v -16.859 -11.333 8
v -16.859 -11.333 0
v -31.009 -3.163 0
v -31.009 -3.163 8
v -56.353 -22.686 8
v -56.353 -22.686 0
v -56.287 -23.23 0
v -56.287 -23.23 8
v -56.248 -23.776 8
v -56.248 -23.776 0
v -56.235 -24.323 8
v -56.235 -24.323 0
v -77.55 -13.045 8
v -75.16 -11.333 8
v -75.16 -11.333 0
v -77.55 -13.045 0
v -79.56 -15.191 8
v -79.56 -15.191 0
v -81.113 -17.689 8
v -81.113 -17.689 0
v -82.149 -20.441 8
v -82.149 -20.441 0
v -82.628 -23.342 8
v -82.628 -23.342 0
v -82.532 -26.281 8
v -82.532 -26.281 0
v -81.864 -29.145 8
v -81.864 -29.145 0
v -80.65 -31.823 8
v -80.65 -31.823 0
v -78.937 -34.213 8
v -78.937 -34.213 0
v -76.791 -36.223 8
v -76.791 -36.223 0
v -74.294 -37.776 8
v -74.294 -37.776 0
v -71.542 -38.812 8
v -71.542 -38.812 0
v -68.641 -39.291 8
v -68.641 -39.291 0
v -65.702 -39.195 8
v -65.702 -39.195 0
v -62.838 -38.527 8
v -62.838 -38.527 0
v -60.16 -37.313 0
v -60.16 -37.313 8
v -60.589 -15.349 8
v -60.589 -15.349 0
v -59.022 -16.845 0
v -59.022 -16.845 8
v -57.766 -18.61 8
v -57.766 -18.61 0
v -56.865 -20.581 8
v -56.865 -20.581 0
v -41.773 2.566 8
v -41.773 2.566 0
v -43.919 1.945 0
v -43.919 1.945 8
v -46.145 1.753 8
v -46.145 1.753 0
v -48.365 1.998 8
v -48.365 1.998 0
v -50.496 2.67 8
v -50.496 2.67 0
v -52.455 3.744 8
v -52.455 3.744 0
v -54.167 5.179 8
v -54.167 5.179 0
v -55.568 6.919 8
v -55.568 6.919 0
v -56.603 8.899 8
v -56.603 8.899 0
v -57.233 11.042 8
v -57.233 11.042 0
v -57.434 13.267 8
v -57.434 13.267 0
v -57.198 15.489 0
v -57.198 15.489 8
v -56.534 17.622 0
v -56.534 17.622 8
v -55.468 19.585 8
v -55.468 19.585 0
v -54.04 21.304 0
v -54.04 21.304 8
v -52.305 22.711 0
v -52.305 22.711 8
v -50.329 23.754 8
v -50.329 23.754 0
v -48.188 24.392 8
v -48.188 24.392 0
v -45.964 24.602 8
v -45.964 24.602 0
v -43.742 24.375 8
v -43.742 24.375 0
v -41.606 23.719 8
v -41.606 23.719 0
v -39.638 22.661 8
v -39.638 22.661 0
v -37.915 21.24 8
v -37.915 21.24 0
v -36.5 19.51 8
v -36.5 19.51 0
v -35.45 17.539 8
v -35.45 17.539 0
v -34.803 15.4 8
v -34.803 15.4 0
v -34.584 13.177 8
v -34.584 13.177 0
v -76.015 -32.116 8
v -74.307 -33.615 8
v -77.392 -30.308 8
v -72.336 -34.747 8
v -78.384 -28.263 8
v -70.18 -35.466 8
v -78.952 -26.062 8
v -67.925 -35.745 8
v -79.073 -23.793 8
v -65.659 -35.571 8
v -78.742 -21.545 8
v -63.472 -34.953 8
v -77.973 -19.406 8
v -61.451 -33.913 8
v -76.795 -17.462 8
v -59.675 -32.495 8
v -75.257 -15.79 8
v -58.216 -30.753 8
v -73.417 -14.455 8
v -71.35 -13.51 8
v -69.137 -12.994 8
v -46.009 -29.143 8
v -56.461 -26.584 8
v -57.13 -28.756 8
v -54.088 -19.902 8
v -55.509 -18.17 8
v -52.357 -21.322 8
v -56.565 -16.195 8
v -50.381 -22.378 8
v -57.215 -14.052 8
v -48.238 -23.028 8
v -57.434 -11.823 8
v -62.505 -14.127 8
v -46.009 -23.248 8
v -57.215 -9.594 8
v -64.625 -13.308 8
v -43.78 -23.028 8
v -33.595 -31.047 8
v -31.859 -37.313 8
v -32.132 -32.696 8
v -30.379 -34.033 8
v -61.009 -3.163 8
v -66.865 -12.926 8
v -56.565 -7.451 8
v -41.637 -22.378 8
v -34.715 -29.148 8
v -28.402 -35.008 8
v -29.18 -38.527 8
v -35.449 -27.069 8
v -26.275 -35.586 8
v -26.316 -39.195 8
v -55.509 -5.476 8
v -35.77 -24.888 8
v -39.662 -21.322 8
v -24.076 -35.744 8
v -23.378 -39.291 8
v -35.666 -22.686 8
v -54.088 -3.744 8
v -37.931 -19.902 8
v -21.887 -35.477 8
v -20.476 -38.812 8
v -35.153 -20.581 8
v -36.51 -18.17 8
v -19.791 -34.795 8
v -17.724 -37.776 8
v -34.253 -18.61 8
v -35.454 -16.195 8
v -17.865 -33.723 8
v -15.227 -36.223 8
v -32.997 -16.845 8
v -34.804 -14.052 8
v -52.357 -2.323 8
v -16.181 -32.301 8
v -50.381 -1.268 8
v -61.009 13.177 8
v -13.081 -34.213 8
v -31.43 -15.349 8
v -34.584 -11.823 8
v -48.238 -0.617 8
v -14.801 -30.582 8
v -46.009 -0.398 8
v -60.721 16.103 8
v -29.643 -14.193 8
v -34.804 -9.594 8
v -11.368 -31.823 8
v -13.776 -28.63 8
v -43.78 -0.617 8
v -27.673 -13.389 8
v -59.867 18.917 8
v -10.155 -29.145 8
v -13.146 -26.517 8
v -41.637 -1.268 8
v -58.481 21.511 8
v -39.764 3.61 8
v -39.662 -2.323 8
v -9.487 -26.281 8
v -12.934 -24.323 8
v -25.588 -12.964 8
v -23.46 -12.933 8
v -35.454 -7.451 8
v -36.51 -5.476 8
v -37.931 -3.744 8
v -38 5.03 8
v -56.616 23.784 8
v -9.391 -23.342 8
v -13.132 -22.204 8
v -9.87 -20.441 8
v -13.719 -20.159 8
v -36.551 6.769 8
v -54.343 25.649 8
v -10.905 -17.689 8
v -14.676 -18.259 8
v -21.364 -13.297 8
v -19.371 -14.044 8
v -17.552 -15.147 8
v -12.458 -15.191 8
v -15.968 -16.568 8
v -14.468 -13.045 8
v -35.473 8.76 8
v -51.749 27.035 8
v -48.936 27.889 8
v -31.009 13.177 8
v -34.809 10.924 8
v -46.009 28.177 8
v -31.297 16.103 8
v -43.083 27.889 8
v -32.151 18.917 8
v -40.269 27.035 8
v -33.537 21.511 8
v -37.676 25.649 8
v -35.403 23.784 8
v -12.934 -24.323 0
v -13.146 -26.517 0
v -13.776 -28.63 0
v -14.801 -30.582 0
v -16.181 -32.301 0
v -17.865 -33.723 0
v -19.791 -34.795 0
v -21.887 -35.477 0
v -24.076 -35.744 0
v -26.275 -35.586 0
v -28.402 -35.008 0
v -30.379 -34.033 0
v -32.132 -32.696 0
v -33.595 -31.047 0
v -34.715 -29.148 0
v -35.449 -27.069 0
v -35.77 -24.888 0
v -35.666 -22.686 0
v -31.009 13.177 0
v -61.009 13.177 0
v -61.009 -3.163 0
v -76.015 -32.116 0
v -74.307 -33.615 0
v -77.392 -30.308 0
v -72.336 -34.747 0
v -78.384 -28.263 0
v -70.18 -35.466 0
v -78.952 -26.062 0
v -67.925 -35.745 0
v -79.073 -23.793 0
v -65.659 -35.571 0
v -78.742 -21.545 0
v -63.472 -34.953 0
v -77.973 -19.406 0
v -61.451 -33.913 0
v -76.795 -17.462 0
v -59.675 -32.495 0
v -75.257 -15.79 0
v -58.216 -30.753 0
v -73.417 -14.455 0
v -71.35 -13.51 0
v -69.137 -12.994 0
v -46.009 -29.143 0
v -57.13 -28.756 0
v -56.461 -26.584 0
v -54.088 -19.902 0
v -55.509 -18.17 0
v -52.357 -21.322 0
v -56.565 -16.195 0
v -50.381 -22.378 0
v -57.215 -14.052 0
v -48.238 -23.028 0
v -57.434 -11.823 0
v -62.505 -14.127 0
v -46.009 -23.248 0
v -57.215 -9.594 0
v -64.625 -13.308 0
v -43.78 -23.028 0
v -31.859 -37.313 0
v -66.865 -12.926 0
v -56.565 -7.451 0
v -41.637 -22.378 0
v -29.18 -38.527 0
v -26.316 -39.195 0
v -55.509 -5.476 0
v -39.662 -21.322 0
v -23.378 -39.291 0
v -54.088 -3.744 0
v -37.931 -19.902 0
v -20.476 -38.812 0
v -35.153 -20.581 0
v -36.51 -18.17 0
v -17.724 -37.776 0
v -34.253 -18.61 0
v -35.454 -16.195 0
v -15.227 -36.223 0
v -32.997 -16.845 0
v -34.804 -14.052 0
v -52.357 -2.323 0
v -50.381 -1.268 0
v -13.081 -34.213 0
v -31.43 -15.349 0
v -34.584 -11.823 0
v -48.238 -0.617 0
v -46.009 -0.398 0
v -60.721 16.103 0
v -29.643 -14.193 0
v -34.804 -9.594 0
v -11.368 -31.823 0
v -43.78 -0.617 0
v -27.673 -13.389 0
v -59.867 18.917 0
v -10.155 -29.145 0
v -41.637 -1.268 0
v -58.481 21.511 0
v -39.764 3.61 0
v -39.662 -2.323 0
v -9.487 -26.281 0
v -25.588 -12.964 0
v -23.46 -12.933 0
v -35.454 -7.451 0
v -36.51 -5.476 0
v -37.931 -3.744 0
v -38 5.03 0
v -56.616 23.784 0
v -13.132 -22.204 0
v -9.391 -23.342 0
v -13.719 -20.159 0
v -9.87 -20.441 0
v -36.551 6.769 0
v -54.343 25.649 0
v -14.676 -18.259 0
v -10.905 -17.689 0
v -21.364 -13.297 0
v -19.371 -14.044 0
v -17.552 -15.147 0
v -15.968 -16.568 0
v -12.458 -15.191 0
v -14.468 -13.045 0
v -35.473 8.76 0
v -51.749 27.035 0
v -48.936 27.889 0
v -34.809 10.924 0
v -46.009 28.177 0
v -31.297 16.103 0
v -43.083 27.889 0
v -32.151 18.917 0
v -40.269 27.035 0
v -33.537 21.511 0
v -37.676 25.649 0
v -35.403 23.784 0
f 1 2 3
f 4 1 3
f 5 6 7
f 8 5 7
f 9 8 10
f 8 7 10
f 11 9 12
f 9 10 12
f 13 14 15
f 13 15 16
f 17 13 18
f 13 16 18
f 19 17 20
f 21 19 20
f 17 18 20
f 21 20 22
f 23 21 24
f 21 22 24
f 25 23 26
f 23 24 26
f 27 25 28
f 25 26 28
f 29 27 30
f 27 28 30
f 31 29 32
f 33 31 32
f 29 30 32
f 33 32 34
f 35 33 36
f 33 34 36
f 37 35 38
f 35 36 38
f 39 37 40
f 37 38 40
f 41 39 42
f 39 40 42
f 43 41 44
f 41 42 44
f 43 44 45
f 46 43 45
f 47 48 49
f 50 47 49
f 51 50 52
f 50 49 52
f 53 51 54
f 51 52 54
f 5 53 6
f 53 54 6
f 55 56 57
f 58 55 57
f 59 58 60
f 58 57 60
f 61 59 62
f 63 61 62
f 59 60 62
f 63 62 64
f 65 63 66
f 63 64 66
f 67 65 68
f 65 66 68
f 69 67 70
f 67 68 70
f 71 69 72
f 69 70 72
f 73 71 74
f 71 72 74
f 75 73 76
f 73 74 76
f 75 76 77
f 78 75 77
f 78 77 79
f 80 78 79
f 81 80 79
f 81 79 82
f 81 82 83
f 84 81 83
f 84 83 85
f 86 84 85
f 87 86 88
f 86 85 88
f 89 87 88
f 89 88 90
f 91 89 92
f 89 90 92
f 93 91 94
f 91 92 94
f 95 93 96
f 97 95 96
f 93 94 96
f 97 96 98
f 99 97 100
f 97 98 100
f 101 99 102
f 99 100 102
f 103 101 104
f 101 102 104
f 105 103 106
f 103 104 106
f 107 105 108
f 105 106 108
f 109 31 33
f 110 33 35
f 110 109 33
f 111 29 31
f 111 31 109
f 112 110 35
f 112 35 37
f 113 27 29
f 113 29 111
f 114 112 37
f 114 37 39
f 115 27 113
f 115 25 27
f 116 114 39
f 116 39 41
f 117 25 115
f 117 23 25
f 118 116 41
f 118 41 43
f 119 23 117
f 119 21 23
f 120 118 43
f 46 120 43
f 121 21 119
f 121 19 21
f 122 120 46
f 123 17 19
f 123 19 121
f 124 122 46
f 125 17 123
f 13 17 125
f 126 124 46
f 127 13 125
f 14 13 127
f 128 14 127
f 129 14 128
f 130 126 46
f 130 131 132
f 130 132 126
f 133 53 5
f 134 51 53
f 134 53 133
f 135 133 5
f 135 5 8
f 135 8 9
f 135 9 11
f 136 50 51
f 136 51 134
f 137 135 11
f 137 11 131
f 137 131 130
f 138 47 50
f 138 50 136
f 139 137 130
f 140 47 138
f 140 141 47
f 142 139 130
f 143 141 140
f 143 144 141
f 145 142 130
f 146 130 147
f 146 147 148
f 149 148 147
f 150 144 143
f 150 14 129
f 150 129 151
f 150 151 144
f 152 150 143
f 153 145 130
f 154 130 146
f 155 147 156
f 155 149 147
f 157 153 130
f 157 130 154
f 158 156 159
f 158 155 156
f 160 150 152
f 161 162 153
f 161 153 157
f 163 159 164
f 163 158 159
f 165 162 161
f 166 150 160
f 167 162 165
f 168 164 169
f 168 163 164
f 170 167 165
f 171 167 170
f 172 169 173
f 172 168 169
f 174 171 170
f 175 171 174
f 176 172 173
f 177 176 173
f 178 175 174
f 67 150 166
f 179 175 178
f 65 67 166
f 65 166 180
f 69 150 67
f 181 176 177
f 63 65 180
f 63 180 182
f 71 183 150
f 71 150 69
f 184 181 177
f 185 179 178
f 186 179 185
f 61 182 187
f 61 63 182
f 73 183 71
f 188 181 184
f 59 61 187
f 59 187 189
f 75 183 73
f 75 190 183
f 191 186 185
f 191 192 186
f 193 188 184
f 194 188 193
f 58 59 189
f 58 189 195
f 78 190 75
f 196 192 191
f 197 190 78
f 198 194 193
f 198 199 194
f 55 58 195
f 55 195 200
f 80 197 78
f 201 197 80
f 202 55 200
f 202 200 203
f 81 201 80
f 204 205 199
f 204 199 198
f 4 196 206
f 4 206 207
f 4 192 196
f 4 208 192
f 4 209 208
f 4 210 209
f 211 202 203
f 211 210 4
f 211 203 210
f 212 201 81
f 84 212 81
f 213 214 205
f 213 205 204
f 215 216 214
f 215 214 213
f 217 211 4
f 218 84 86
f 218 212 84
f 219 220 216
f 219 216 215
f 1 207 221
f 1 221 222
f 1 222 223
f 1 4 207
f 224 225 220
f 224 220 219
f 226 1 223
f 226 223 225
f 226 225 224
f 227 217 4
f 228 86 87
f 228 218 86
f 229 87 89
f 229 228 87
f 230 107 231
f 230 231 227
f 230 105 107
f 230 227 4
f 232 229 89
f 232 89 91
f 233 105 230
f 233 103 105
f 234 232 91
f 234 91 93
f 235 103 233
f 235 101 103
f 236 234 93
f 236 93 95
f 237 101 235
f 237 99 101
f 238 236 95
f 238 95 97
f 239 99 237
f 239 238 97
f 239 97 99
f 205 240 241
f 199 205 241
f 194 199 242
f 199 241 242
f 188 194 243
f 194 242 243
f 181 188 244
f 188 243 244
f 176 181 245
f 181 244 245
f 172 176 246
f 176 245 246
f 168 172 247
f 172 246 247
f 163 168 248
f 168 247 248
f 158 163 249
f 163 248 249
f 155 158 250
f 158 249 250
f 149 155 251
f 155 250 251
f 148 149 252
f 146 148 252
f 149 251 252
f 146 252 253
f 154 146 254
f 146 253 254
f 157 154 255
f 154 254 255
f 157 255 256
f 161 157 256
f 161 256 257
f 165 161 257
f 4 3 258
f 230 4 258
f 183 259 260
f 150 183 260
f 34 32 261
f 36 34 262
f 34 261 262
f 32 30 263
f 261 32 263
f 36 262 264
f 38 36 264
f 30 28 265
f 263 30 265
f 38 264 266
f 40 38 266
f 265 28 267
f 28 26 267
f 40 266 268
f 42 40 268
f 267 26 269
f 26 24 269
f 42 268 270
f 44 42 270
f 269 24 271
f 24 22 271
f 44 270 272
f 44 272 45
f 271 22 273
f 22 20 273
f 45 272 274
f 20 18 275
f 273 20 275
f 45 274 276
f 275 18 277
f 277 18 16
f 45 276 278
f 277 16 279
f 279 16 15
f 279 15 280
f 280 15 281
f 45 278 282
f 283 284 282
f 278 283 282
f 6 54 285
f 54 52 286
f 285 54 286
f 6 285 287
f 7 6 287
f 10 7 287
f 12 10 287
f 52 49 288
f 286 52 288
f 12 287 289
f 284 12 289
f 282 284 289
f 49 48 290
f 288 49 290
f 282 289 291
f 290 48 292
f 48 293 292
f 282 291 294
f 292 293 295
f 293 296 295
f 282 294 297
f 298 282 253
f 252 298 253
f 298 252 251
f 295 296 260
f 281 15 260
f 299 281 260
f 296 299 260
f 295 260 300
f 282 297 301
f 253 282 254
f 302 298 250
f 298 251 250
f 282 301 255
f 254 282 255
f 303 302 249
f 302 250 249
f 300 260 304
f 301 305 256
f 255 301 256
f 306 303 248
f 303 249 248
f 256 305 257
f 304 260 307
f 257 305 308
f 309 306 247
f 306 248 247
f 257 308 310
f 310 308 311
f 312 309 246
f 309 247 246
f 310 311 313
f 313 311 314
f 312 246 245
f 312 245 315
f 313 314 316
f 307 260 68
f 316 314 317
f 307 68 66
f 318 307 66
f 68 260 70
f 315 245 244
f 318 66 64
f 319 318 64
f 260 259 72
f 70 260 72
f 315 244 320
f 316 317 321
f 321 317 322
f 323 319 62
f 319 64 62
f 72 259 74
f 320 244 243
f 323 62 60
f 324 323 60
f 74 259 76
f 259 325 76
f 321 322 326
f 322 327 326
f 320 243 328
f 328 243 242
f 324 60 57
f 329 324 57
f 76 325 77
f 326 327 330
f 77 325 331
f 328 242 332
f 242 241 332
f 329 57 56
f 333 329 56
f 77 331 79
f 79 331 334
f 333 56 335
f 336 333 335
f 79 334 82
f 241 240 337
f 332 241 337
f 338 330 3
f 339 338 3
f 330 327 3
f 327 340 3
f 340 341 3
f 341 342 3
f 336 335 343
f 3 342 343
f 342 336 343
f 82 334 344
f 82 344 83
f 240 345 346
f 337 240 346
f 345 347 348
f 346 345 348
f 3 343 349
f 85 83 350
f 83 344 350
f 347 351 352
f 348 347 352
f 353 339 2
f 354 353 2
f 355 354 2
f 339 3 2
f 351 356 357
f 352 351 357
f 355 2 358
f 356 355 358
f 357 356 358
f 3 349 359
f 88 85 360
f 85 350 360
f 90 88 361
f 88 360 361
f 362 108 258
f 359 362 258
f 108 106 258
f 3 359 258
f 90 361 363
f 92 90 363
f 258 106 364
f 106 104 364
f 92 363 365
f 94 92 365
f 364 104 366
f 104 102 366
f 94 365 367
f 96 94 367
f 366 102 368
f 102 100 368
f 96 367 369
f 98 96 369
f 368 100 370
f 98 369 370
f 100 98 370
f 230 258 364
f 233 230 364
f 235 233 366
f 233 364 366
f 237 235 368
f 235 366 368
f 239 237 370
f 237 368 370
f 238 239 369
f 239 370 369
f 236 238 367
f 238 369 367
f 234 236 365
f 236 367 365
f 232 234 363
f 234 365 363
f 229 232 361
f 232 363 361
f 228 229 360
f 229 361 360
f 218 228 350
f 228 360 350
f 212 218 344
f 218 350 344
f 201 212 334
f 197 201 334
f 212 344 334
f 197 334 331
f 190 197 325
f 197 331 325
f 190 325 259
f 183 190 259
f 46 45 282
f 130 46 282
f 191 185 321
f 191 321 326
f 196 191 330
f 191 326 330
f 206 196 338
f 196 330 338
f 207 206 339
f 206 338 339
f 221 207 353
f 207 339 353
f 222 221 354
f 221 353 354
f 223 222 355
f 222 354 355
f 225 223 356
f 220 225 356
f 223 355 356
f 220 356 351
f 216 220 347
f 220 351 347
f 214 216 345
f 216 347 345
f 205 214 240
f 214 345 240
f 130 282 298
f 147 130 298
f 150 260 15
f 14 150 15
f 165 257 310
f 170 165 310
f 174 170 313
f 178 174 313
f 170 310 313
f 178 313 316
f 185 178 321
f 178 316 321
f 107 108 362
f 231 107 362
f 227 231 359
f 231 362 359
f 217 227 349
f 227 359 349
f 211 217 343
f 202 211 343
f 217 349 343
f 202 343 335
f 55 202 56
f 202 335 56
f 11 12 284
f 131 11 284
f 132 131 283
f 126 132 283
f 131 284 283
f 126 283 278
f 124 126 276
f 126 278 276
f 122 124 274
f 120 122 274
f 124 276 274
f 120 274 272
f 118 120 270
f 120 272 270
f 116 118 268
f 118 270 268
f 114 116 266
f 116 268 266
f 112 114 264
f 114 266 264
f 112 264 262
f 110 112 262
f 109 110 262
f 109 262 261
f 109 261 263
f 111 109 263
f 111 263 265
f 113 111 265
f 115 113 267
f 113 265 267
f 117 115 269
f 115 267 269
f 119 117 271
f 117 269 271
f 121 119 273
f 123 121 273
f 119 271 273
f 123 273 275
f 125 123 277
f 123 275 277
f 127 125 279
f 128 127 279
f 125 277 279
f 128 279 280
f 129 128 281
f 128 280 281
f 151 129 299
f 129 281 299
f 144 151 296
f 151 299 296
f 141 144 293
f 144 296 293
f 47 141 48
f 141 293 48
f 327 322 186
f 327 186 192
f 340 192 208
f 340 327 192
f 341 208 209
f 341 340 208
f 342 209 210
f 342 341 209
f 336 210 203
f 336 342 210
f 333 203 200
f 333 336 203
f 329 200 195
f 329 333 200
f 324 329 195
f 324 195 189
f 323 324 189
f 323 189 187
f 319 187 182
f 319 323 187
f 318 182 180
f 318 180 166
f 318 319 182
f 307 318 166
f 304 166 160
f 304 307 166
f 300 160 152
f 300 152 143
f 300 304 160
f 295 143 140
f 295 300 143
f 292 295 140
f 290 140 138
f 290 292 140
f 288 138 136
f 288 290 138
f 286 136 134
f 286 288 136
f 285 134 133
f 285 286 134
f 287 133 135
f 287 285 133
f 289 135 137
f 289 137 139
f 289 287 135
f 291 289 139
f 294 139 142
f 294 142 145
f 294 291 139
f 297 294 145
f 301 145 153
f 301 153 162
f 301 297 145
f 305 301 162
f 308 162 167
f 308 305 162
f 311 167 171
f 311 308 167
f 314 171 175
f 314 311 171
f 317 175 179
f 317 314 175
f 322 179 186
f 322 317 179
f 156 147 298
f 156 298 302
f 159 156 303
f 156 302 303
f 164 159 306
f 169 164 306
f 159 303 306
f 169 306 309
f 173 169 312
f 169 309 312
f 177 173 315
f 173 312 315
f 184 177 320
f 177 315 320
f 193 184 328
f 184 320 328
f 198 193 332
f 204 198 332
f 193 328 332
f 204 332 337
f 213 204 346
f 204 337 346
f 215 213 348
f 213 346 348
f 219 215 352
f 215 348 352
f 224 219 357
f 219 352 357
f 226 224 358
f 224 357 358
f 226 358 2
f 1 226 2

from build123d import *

# Parameters (mm, degrees)
F0_R     = 11.425
F1_DEPTH = 8


with BuildPart() as f1:
    # F0 (on Top) → F1 (new body)
    with BuildSketch(Plane.XY):
        with BuildLine():
            ThreePointArc((-50.2454332161, 2.5664754466), (-52.4174873095, 22.6356659226), (-34.5842170537, 13.1770879466))
            ThreePointArc((-34.5842170537, 13.1770879466), (-36.5506390777, 6.7688176907), (-41.7730008912, 2.5664754466))
            ThreePointArc((-41.7730008912, 2.5664754466), (-40.0995641696, 1.963893334), (-38.5092170537, 1.1674690033))
            Line((-38.5092170537, 1.1674690033), (-31.0092170537, -3.1626580156))
            Line((-31.0092170537, -3.1626580156), (-31.0092170537, 13.1770879466))
            ThreePointArc((-31.0092170537, 13.1770879466), (-46.0092170537, 28.1770879466), (-61.0092170537, 13.1770879466))
            Line((-61.0092170537, 13.1770879466), (-61.0092170537, -3.1626580156))
            Line((-61.0092170537, -3.1626580156), (-53.5092170537, 1.1674690033))
            ThreePointArc((-53.5092170537, 1.1674690033), (-51.9188699377, 1.963893334), (-50.2454332161, 2.5664754466))
        make_face()
        with BuildLine():
            ThreePointArc((-61.0092170537, -11.8229120534), (-58.9995981104, -4.3229120534), (-53.5092170537, 1.1674690033))
            Line((-53.5092170537, 1.1674690033), (-61.0092170537, -3.1626580156))
            Line((-61.0092170537, -3.1626580156), (-61.0092170537, -11.8229120534))
        make_face()
        with BuildLine():
            Line((-31.0092170537, -3.1626580156), (-38.5092170537, 1.1674690033))
            ThreePointArc((-38.5092170537, 1.1674690033), (-33.0188359969, -4.3229120534), (-31.0092170537, -11.8229120534))
            Line((-31.0092170537, -11.8229120534), (-31.0092170537, -3.1626580156))
        make_face()
        with BuildLine():
            Line((-61.0092170537, -11.8229120534), (-61.0092170537, -3.1626580156))
            Line((-61.0092170537, -3.1626580156), (-75.1598521483, -11.3325309967))
            ThreePointArc((-75.1598521483, -11.3325309967), (-80.650233205, -31.8229120534), (-60.1598521483, -37.3132931102))
            Line((-60.1598521483, -37.3132931102), (-46.0092170537, -29.1434201291))
            Line((-46.0092170537, -29.1434201291), (-53.5092170537, -24.8132931102))
            ThreePointArc((-53.5092170537, -24.8132931102), (-54.9941143142, -23.8342242723), (-56.3526840923, -22.686276616))
            ThreePointArc((-56.3526840923, -22.686276616), (-56.2643482095, -23.5024762055), (-56.2348521483, -24.3229120534))
            ThreePointArc((-56.2348521483, -24.3229120534), (-77.9388659721, -29.3101457364), (-60.5889002548, -15.3489349908))
            ThreePointArc((-60.5889002548, -15.3489349908), (-60.9037671982, -13.598405222), (-61.0092170537, -11.8229120534))
        make_face()
        with BuildLine():
            Line((-31.0092170537, -3.1626580156), (-31.0092170537, -11.8229120534))
            ThreePointArc((-31.0092170537, -11.8229120534), (-31.1146669091, -13.598405222), (-31.4295338525, -15.3489349908))
            ThreePointArc((-31.4295338525, -15.3489349908), (-19.3713482761, -14.0438982295), (-12.933581959, -24.3229120534))
            ThreePointArc((-12.933581959, -24.3229120534), (-25.1790178069, -35.7184159922), (-35.665750015, -22.686276616))
            ThreePointArc((-35.665750015, -22.686276616), (-37.0243197932, -23.8342242723), (-38.5092170537, -24.8132931102))
            Line((-38.5092170537, -24.8132931102), (-46.0092170537, -29.1434201291))
            Line((-46.0092170537, -29.1434201291), (-31.858581959, -37.3132931102))
            ThreePointArc((-31.858581959, -37.3132931102), (-11.3682009023, -31.8229120534), (-16.858581959, -11.3325309967))
            Line((-16.858581959, -11.3325309967), (-31.0092170537, -3.1626580156))
        make_face()
        with BuildLine():
            Line((-53.5092170537, -24.8132931102), (-46.0092170537, -29.1434201291))
            Line((-46.0092170537, -29.1434201291), (-38.5092170537, -24.8132931102))
            ThreePointArc((-38.5092170537, -24.8132931102), (-46.0092170537, -26.8229120534), (-53.5092170537, -24.8132931102))
        make_face()
        with BuildLine():
            ThreePointArc((-41.7730008912, 2.5664754466), (-46.0092170537, 1.7520879466), (-50.2454332161, 2.5664754466))
            ThreePointArc((-50.2454332161, 2.5664754466), (-51.9188699377, 1.963893334), (-53.5092170537, 1.1674690033))
            ThreePointArc((-53.5092170537, 1.1674690033), (-58.9995981104, -4.3229120534), (-61.0092170537, -11.8229120534))
            ThreePointArc((-61.0092170537, -11.8229120534), (-60.9037671982, -13.598405222), (-60.5889002548, -15.3489349908))
            ThreePointArc((-60.5889002548, -15.3489349908), (-57.76551191, -18.6104120534), (-56.3526840923, -22.686276616))
            ThreePointArc((-56.3526840923, -22.686276616), (-54.9941143142, -23.8342242723), (-53.5092170537, -24.8132931102))
            ThreePointArc((-53.5092170537, -24.8132931102), (-46.0092170537, -26.8229120534), (-38.5092170537, -24.8132931102))
            ThreePointArc((-38.5092170537, -24.8132931102), (-37.0243197932, -23.8342242723), (-35.665750015, -22.686276616))
            ThreePointArc((-35.665750015, -22.686276616), (-34.2529221973, -18.6104120534), (-31.4295338525, -15.3489349908))
            ThreePointArc((-31.4295338525, -15.3489349908), (-31.1146669091, -13.598405222), (-31.0092170537, -11.8229120534))
            ThreePointArc((-31.0092170537, -11.8229120534), (-33.0188359969, -4.3229120534), (-38.5092170537, 1.1674690033))
            ThreePointArc((-38.5092170537, 1.1674690033), (-40.0995641696, 1.963893334), (-41.7730008912, 2.5664754466))
        make_face()
        with Locations((-46.0092170537, -11.8229120534)):
            Circle(F0_R, mode=Mode.SUBTRACT)
    extrude(amount=F1_DEPTH)


solid = f1.part
